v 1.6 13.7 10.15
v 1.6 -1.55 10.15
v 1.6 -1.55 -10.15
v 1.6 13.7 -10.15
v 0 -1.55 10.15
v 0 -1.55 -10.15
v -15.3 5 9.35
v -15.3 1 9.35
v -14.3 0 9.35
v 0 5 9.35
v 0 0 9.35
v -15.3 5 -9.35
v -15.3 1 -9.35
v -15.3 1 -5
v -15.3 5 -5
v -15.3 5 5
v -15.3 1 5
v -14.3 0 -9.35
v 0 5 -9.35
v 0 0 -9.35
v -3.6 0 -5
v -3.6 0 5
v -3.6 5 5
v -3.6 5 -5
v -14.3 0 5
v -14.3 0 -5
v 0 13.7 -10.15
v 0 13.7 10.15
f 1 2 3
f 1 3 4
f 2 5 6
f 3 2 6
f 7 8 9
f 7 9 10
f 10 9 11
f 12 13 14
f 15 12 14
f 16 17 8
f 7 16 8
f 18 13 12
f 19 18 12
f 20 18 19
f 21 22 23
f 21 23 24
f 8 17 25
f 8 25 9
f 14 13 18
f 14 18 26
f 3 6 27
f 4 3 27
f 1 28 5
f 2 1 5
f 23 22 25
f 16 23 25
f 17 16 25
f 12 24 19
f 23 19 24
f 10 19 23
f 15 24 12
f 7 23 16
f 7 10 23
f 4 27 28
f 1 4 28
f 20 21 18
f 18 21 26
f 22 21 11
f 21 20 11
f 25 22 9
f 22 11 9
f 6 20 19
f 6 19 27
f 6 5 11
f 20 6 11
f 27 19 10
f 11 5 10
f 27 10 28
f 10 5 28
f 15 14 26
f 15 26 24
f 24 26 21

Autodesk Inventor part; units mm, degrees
ref_plane "YZ Plane" through (0, 0, 0) normal (1, 0, 0) x (0, 1, 0)
ref_plane "XZ Plane" through (0, 0, 0) normal (0, 1, 0) x (-1, 0, 0)
ref_plane "XY Plane" through (0, 0, 0) normal (0, 0, 1) x (1, 0, 0)
sketch "Skizze1" plane through (0, 0, 0) normal (0, 1, 0) x (-1, 0, 0)
  line L0 (0, 0) -> (13.65, 0) construction
  line L1 (15.3, 9.35) -> (0, 9.35)
  line L2 (3.6, 5) -> (15.3, 5)
  line L3 (15.3, 5) -> (15.3, 9.35)
  line L4 (0, 9.35) -> (3.95, 9.35)
  line L5 (3.6, 5) -> (3.6, -5)
  line L6 (3.95, -9.35) -> (0, -9.35)
  line L7 (0, -9.35) -> (0, 9.35)
  line L8 (0, -9.35) -> (15.3, -9.35)
  line L9 (15.3, -9.35) -> (15.3, -5)
  line L10 (15.3, -5) -> (3.6, -5)
  dimension "d0" = 18.7
  dimension "d1" = 10
  dimension "d2" = 15.3
  dimension "d3" = 3.6
extrude "Extrusion1" add sketch "Skizze1" along normal blind 5
sketch "Skizze3" plane through (0, 0, 0) normal (1, 0, 0) x (0, 1, 0)
  line L0 (0, 9.35) -> (0, -9.35) projected
  line L1 (0, -9.35) -> (5, -9.35) projected
  line L2 (5, 9.35) -> (5, -9.35) projected
  line L3 (0, 9.35) -> (5, 9.35) projected
  line L4 (13.7, 10.15) -> (-1.55, 10.15)
  line L5 (-1.55, 10.15) -> (-1.55, -10.15)
  line L6 (-1.55, -10.15) -> (13.7, -10.15)
  line L7 (13.7, -10.15) -> (13.7, 10.15)
  line L8 (0, 0) -> (5, 0) construction
  dimension "d6" = 15.25
  dimension "d7" = 20.3
  dimension "d8" = 8.7
  dimension "d9" = 1.55
extrude "Extrusion2" add sketch "Skizze3" along normal blind 1.6 contours L3 L2 L1 L0 | L7 L6 L5 L4
chamfer "Fase1" distance 1 angle 45 2 edges at (-15.3, 0, -7.175) (-15.3, 0, 7.175)
properties part number "SYS IR Sensor"
